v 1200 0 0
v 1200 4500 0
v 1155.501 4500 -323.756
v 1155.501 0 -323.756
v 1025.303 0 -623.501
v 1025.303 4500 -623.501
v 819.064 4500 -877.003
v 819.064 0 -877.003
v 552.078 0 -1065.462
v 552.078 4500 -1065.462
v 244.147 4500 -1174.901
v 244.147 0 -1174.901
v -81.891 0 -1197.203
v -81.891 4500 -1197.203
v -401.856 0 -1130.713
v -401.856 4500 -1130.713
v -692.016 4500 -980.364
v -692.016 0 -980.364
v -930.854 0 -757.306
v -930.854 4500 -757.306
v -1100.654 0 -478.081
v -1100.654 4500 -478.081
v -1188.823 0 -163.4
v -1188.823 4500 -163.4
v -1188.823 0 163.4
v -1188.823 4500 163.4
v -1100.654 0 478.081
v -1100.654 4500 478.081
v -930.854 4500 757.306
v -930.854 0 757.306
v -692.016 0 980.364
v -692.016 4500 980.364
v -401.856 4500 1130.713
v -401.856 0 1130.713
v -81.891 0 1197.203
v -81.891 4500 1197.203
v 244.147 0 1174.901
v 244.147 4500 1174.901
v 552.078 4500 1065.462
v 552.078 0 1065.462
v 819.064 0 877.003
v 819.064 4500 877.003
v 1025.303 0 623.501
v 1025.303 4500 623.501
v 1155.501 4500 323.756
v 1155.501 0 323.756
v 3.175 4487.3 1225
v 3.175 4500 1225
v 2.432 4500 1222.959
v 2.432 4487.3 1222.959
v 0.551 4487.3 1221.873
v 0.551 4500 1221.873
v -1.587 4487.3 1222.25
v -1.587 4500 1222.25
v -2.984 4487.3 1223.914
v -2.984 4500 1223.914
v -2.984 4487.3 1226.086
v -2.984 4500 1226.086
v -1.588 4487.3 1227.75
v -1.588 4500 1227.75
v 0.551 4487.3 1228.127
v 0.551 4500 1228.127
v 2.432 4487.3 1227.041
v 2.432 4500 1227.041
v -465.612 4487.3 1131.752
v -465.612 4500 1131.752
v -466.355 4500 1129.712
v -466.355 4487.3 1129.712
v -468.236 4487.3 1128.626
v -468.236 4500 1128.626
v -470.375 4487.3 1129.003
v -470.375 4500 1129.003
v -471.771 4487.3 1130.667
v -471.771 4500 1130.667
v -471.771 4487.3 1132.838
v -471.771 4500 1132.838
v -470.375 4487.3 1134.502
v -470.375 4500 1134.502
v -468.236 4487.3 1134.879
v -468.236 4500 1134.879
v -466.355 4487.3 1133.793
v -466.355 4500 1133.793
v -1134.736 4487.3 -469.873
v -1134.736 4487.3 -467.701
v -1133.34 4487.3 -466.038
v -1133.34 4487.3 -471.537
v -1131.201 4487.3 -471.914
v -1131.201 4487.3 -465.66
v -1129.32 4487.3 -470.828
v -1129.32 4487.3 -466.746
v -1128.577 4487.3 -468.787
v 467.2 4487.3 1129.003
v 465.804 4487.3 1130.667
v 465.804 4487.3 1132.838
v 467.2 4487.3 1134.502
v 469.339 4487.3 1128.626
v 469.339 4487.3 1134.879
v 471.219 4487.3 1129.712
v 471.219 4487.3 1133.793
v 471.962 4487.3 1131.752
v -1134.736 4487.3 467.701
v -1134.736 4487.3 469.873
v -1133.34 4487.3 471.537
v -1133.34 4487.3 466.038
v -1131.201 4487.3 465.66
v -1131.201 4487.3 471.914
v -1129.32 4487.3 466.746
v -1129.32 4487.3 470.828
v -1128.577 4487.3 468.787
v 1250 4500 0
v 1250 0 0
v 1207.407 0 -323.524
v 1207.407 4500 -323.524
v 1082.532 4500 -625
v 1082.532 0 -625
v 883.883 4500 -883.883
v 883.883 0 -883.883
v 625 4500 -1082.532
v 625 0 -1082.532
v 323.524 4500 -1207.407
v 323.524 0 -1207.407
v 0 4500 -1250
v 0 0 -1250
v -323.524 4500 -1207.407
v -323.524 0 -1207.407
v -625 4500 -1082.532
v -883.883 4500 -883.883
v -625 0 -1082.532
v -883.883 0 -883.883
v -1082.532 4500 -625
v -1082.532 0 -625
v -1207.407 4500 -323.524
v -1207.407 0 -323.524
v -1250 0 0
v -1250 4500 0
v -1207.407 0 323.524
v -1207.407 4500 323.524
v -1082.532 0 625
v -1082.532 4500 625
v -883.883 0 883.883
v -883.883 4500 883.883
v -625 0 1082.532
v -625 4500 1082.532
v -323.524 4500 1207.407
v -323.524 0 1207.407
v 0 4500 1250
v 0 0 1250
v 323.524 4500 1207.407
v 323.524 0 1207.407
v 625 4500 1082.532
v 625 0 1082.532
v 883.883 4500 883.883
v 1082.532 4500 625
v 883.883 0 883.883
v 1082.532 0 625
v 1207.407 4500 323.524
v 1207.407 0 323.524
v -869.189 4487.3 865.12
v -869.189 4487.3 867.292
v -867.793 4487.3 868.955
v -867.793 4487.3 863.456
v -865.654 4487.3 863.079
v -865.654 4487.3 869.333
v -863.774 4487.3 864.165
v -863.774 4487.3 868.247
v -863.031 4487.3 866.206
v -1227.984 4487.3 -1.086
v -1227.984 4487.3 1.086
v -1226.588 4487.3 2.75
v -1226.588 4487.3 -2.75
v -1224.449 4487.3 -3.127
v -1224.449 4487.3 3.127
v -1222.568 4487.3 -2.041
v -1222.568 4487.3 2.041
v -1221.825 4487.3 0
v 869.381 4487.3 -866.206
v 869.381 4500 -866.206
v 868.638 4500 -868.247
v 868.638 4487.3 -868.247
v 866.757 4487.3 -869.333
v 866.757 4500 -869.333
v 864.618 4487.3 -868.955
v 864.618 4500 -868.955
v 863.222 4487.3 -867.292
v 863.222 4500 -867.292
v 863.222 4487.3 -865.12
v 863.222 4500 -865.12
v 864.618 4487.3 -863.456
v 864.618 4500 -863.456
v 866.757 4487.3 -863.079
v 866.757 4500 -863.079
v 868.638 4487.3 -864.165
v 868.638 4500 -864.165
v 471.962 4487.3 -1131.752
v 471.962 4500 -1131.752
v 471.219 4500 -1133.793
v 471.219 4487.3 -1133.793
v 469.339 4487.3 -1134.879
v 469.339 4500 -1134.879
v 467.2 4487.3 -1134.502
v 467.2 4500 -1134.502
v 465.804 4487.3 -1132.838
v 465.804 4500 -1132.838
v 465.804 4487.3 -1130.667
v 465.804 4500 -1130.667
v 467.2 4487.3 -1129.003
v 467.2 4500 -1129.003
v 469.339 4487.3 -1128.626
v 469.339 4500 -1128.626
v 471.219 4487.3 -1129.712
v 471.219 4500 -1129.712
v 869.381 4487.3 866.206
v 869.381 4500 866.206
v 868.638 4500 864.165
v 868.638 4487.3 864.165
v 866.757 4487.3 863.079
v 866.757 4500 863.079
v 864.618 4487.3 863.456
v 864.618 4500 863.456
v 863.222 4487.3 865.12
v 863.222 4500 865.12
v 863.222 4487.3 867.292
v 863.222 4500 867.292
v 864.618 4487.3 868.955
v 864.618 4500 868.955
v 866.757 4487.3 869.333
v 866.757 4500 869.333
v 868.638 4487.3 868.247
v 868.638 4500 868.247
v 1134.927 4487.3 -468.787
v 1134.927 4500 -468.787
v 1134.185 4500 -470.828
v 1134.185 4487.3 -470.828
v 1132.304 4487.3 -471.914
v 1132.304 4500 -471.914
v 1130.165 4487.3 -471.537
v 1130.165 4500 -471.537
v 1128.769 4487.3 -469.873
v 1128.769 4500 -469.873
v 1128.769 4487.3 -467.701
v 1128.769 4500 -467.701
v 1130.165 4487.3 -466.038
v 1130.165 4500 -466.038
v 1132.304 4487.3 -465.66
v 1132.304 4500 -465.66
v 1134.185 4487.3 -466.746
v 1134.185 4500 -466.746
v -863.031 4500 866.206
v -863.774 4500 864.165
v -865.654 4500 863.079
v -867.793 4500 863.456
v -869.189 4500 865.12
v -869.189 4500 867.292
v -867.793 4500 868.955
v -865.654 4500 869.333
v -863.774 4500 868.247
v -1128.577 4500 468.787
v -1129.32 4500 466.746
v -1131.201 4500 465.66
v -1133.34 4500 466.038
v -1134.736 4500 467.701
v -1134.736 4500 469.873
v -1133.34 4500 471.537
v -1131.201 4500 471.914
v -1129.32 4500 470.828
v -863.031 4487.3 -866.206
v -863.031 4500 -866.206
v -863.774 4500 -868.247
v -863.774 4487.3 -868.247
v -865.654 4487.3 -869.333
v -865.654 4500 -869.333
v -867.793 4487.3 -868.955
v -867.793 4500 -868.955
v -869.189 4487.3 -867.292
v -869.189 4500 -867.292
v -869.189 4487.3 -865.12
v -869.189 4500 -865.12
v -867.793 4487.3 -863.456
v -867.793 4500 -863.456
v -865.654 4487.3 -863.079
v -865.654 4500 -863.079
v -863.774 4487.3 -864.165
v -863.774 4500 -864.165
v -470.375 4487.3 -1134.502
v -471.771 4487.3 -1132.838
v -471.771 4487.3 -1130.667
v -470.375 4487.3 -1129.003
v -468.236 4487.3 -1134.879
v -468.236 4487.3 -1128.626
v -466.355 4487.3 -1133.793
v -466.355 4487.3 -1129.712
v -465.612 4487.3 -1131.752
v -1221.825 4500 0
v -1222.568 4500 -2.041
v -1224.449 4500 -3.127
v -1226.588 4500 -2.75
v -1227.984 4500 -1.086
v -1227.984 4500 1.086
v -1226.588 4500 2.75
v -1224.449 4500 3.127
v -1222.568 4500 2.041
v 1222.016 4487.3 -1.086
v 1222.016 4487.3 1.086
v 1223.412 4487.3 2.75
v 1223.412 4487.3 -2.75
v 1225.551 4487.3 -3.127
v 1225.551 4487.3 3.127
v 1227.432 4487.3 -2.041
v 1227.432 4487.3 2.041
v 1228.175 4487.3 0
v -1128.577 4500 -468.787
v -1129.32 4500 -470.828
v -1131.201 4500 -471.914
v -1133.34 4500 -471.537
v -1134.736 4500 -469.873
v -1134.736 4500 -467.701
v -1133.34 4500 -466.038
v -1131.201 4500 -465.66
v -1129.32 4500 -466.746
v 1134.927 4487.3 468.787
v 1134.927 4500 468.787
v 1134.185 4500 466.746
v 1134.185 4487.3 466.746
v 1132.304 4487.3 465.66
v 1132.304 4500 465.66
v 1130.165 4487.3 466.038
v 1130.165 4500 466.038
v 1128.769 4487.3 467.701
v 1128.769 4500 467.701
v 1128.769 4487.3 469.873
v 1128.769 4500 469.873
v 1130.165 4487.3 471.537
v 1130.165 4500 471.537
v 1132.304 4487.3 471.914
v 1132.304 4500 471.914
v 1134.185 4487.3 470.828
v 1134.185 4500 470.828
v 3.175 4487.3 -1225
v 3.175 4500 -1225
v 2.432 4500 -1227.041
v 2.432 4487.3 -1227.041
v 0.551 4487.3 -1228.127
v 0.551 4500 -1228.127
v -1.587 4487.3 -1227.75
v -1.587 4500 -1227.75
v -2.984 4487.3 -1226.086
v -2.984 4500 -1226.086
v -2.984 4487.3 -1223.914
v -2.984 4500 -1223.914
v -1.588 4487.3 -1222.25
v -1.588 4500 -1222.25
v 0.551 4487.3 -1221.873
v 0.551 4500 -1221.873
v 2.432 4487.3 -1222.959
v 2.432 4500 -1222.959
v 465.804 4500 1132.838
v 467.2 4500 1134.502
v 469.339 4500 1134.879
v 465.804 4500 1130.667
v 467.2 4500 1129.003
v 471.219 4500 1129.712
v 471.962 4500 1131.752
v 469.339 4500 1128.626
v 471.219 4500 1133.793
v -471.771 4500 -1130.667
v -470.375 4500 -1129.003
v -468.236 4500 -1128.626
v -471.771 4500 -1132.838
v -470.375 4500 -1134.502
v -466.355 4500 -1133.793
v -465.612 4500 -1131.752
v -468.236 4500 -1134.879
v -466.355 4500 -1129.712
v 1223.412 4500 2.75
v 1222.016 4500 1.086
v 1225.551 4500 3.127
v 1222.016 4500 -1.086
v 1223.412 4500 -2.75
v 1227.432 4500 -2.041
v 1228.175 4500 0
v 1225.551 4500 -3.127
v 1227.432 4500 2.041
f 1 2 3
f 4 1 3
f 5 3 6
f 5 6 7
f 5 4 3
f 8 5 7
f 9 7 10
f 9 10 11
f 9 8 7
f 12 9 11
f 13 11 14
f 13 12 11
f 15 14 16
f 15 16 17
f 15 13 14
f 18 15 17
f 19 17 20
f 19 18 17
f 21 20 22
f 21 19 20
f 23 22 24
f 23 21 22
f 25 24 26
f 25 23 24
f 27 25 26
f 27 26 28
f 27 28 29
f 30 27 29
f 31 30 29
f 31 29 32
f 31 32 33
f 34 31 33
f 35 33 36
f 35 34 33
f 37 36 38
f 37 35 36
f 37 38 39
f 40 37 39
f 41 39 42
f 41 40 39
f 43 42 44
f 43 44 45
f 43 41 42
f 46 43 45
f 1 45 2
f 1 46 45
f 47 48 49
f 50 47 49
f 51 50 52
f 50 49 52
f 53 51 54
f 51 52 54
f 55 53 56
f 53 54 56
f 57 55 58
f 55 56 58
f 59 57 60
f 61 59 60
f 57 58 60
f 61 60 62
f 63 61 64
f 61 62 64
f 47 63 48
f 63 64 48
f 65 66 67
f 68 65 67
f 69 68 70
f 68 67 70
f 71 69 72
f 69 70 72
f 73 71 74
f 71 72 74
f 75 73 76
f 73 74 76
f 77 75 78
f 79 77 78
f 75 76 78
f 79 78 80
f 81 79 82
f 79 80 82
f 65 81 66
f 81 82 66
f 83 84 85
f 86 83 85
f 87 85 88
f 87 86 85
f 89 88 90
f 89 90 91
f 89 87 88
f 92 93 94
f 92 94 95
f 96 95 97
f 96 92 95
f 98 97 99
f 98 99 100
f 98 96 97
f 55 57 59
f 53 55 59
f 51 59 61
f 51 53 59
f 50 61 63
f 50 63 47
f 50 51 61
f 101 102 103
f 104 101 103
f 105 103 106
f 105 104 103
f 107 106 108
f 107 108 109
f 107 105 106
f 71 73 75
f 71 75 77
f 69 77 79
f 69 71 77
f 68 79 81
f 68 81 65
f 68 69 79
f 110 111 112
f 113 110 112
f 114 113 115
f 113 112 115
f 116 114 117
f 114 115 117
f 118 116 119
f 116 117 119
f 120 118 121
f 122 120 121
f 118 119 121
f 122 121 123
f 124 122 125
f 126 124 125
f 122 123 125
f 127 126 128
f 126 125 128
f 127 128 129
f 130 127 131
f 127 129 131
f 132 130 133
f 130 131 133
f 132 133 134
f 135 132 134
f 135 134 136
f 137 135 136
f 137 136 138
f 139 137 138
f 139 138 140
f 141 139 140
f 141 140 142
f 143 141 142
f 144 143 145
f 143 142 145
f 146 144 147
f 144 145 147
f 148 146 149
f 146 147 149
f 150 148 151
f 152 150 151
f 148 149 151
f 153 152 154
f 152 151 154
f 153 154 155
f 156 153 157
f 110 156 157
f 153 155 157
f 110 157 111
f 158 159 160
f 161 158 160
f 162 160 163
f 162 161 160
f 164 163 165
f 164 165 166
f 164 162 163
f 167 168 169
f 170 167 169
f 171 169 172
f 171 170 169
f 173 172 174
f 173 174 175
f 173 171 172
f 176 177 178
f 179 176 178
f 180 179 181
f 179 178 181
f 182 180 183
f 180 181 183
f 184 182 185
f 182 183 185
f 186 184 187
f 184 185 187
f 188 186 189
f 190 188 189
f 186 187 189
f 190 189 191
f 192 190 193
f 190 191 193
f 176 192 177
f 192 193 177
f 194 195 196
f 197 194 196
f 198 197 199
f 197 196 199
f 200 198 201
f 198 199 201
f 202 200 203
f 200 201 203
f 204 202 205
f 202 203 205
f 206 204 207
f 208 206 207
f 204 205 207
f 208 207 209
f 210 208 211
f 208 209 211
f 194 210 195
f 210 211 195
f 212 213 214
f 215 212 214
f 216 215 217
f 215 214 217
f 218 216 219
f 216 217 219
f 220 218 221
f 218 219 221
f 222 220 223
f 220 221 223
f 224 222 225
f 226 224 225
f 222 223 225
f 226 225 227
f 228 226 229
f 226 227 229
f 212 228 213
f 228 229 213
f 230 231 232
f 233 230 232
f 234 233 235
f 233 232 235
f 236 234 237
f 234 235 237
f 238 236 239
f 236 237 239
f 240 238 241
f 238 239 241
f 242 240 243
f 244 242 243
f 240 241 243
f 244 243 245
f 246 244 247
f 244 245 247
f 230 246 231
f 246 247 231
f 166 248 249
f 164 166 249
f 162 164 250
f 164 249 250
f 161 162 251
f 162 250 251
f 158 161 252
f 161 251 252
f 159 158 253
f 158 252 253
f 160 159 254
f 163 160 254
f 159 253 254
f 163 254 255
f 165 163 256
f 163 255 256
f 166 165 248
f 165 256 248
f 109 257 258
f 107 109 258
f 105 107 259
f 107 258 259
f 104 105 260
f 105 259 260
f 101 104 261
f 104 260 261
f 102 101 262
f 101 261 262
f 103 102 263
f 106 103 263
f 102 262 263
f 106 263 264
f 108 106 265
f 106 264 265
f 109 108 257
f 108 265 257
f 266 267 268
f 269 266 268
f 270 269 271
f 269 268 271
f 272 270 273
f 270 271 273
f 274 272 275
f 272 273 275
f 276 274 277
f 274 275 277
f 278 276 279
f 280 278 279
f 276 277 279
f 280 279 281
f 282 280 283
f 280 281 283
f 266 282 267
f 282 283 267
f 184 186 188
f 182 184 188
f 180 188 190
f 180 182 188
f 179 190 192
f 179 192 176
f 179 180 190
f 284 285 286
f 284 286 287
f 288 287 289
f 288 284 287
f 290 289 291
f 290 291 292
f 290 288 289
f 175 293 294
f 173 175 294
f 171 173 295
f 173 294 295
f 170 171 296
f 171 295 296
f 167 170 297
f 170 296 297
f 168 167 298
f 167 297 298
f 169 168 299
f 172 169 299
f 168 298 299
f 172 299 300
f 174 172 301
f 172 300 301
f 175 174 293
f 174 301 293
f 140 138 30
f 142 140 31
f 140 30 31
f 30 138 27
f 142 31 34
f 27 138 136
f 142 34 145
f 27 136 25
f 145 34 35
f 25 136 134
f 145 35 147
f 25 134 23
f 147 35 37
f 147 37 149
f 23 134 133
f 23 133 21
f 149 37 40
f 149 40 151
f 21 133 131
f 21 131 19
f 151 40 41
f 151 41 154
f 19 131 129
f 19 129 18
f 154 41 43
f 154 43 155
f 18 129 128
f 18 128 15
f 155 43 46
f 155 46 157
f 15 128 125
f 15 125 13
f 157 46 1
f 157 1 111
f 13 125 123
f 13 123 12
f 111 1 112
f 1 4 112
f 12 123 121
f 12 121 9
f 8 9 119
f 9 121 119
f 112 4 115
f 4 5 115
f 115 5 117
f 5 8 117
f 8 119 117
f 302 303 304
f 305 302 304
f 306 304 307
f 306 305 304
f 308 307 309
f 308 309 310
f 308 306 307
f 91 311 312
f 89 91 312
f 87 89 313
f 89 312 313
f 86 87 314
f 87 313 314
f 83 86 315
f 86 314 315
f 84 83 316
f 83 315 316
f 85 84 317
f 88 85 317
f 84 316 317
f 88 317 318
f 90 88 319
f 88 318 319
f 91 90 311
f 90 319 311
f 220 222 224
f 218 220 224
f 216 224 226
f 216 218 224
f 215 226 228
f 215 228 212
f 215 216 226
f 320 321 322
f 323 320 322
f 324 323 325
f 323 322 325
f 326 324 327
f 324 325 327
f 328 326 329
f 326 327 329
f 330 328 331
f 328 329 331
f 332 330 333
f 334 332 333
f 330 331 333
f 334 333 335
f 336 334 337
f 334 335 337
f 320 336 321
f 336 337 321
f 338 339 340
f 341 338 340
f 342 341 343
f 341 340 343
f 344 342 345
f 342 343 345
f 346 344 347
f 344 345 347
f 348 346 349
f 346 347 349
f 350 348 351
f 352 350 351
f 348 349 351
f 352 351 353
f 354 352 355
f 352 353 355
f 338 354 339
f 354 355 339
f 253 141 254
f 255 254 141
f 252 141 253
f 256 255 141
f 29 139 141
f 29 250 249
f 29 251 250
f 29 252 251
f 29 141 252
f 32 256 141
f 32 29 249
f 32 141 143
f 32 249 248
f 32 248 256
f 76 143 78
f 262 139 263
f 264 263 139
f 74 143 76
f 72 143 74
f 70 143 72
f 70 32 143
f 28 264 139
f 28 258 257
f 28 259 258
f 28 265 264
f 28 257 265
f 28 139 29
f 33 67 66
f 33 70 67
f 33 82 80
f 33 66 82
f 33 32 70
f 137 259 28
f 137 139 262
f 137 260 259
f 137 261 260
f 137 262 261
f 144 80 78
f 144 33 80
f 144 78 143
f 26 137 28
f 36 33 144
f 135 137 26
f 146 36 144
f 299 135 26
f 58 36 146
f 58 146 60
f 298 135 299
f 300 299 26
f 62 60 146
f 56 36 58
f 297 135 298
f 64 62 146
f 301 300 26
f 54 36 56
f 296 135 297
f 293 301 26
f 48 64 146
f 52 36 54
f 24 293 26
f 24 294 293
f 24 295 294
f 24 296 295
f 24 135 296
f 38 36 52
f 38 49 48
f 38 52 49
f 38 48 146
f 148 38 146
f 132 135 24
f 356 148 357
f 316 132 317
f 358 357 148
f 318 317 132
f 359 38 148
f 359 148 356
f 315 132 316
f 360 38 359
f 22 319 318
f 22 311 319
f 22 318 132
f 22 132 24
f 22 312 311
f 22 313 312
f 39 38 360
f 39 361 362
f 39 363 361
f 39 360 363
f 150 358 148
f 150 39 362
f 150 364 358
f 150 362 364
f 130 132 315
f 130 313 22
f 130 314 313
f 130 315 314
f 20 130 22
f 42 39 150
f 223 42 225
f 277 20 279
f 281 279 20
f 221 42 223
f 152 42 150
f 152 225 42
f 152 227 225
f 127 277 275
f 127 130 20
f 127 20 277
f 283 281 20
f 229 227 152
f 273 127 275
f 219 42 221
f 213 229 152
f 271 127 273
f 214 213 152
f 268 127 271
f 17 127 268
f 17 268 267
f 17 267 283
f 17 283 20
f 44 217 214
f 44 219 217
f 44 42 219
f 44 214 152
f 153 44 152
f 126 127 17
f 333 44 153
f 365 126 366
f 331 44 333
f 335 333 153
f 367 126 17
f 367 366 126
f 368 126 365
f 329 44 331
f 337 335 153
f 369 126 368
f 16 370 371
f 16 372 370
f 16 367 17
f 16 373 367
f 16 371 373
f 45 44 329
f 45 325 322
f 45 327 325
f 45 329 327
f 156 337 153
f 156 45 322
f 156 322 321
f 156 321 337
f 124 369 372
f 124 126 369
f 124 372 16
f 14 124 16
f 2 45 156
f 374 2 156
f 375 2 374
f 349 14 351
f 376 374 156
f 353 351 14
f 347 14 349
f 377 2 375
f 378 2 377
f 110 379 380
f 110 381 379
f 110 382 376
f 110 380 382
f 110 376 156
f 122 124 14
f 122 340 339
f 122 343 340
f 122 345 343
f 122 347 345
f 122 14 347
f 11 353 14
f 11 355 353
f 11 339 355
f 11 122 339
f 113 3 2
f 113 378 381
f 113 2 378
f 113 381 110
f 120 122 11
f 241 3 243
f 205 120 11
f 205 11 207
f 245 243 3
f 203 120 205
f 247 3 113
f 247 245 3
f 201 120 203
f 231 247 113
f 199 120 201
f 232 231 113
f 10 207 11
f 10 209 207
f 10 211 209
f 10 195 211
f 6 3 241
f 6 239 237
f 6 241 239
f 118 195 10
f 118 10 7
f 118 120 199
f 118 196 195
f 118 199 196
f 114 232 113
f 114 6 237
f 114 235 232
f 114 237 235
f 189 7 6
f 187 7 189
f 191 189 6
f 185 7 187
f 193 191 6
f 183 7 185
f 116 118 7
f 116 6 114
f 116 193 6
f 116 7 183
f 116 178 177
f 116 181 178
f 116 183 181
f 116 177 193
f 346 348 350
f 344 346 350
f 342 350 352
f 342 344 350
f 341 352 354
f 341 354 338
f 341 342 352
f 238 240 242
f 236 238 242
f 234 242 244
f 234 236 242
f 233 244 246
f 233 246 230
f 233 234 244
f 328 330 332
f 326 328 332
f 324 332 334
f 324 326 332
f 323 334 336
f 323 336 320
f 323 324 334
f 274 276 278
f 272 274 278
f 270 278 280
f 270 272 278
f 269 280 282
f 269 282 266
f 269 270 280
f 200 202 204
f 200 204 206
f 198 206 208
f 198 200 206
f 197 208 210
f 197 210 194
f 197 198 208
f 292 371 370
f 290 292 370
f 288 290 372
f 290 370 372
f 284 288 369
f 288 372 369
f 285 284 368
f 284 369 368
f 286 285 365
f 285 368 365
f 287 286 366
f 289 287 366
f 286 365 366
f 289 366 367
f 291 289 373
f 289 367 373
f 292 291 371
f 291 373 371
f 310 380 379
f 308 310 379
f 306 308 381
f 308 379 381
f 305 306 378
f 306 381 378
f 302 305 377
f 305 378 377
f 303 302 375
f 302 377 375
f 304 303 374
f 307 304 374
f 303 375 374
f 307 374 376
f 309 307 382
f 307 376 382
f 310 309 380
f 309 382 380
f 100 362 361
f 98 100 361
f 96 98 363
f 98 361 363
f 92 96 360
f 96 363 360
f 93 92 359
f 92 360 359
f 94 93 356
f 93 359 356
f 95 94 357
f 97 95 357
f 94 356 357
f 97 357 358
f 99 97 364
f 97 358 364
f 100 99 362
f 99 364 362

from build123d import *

# Parameters (mm, degrees)
SKETCH1_R           = 1250
SKETCH1_R_2         = 1200.000000046
BOSS_EXTRUDE1_DEPTH = 4500
SKETCH2_R           = 3.175
CUT_EXTRUDE1_DEPTH  = 12.7


with BuildPart() as part:
    # Sketch1 → Boss-Extrude1 (new body)
    with BuildSketch(Plane(origin=(0, 0, 0), x_dir=(1, 0, 0), z_dir=(0, 1, 0))):
        Circle(SKETCH1_R)
        Circle(SKETCH1_R_2, mode=Mode.SUBTRACT)
    extrude(amount=BOSS_EXTRUDE1_DEPTH)

    # Sketch2 → Cut-Extrude1 (cut)
    with BuildSketch(Plane(origin=(0, 4500, 0), x_dir=(1, 0, 0), z_dir=(0, 1, 0))):
        with Locations((-1225, 0)):
            Circle(SKETCH2_R)
        with Locations((-1131.752427326, 468.787204647)):
            Circle(SKETCH2_R)
        with Locations((-866.205806954, 866.205806954)):
            Circle(SKETCH2_R)
        with Locations((-468.787204647, 1131.752427326)):
            Circle(SKETCH2_R)
        with Locations((0, 1225)):
            Circle(SKETCH2_R)
        with Locations((468.787204647, 1131.752427326)):
            Circle(SKETCH2_R)
        with Locations((866.205806954, 866.205806954)):
            Circle(SKETCH2_R)
        with Locations((1131.752427326, 468.787204647)):
            Circle(SKETCH2_R)
        with Locations((1225, 0)):
            Circle(SKETCH2_R)
        with Locations((1131.752427326, -468.787204647)):
            Circle(SKETCH2_R)
        with Locations((866.205806954, -866.205806954)):
            Circle(SKETCH2_R)
        with Locations((468.787204647, -1131.752427326)):
            Circle(SKETCH2_R)
        with Locations((0, -1225)):
            Circle(SKETCH2_R)
        with Locations((-468.787204647, -1131.752427326)):
            Circle(SKETCH2_R)
        with Locations((-866.205806954, -866.205806954)):
            Circle(SKETCH2_R)
        with Locations((-1131.752427326, -468.787204647)):
            Circle(SKETCH2_R)
    extrude(amount=-CUT_EXTRUDE1_DEPTH, mode=Mode.SUBTRACT)


solid = part.part
